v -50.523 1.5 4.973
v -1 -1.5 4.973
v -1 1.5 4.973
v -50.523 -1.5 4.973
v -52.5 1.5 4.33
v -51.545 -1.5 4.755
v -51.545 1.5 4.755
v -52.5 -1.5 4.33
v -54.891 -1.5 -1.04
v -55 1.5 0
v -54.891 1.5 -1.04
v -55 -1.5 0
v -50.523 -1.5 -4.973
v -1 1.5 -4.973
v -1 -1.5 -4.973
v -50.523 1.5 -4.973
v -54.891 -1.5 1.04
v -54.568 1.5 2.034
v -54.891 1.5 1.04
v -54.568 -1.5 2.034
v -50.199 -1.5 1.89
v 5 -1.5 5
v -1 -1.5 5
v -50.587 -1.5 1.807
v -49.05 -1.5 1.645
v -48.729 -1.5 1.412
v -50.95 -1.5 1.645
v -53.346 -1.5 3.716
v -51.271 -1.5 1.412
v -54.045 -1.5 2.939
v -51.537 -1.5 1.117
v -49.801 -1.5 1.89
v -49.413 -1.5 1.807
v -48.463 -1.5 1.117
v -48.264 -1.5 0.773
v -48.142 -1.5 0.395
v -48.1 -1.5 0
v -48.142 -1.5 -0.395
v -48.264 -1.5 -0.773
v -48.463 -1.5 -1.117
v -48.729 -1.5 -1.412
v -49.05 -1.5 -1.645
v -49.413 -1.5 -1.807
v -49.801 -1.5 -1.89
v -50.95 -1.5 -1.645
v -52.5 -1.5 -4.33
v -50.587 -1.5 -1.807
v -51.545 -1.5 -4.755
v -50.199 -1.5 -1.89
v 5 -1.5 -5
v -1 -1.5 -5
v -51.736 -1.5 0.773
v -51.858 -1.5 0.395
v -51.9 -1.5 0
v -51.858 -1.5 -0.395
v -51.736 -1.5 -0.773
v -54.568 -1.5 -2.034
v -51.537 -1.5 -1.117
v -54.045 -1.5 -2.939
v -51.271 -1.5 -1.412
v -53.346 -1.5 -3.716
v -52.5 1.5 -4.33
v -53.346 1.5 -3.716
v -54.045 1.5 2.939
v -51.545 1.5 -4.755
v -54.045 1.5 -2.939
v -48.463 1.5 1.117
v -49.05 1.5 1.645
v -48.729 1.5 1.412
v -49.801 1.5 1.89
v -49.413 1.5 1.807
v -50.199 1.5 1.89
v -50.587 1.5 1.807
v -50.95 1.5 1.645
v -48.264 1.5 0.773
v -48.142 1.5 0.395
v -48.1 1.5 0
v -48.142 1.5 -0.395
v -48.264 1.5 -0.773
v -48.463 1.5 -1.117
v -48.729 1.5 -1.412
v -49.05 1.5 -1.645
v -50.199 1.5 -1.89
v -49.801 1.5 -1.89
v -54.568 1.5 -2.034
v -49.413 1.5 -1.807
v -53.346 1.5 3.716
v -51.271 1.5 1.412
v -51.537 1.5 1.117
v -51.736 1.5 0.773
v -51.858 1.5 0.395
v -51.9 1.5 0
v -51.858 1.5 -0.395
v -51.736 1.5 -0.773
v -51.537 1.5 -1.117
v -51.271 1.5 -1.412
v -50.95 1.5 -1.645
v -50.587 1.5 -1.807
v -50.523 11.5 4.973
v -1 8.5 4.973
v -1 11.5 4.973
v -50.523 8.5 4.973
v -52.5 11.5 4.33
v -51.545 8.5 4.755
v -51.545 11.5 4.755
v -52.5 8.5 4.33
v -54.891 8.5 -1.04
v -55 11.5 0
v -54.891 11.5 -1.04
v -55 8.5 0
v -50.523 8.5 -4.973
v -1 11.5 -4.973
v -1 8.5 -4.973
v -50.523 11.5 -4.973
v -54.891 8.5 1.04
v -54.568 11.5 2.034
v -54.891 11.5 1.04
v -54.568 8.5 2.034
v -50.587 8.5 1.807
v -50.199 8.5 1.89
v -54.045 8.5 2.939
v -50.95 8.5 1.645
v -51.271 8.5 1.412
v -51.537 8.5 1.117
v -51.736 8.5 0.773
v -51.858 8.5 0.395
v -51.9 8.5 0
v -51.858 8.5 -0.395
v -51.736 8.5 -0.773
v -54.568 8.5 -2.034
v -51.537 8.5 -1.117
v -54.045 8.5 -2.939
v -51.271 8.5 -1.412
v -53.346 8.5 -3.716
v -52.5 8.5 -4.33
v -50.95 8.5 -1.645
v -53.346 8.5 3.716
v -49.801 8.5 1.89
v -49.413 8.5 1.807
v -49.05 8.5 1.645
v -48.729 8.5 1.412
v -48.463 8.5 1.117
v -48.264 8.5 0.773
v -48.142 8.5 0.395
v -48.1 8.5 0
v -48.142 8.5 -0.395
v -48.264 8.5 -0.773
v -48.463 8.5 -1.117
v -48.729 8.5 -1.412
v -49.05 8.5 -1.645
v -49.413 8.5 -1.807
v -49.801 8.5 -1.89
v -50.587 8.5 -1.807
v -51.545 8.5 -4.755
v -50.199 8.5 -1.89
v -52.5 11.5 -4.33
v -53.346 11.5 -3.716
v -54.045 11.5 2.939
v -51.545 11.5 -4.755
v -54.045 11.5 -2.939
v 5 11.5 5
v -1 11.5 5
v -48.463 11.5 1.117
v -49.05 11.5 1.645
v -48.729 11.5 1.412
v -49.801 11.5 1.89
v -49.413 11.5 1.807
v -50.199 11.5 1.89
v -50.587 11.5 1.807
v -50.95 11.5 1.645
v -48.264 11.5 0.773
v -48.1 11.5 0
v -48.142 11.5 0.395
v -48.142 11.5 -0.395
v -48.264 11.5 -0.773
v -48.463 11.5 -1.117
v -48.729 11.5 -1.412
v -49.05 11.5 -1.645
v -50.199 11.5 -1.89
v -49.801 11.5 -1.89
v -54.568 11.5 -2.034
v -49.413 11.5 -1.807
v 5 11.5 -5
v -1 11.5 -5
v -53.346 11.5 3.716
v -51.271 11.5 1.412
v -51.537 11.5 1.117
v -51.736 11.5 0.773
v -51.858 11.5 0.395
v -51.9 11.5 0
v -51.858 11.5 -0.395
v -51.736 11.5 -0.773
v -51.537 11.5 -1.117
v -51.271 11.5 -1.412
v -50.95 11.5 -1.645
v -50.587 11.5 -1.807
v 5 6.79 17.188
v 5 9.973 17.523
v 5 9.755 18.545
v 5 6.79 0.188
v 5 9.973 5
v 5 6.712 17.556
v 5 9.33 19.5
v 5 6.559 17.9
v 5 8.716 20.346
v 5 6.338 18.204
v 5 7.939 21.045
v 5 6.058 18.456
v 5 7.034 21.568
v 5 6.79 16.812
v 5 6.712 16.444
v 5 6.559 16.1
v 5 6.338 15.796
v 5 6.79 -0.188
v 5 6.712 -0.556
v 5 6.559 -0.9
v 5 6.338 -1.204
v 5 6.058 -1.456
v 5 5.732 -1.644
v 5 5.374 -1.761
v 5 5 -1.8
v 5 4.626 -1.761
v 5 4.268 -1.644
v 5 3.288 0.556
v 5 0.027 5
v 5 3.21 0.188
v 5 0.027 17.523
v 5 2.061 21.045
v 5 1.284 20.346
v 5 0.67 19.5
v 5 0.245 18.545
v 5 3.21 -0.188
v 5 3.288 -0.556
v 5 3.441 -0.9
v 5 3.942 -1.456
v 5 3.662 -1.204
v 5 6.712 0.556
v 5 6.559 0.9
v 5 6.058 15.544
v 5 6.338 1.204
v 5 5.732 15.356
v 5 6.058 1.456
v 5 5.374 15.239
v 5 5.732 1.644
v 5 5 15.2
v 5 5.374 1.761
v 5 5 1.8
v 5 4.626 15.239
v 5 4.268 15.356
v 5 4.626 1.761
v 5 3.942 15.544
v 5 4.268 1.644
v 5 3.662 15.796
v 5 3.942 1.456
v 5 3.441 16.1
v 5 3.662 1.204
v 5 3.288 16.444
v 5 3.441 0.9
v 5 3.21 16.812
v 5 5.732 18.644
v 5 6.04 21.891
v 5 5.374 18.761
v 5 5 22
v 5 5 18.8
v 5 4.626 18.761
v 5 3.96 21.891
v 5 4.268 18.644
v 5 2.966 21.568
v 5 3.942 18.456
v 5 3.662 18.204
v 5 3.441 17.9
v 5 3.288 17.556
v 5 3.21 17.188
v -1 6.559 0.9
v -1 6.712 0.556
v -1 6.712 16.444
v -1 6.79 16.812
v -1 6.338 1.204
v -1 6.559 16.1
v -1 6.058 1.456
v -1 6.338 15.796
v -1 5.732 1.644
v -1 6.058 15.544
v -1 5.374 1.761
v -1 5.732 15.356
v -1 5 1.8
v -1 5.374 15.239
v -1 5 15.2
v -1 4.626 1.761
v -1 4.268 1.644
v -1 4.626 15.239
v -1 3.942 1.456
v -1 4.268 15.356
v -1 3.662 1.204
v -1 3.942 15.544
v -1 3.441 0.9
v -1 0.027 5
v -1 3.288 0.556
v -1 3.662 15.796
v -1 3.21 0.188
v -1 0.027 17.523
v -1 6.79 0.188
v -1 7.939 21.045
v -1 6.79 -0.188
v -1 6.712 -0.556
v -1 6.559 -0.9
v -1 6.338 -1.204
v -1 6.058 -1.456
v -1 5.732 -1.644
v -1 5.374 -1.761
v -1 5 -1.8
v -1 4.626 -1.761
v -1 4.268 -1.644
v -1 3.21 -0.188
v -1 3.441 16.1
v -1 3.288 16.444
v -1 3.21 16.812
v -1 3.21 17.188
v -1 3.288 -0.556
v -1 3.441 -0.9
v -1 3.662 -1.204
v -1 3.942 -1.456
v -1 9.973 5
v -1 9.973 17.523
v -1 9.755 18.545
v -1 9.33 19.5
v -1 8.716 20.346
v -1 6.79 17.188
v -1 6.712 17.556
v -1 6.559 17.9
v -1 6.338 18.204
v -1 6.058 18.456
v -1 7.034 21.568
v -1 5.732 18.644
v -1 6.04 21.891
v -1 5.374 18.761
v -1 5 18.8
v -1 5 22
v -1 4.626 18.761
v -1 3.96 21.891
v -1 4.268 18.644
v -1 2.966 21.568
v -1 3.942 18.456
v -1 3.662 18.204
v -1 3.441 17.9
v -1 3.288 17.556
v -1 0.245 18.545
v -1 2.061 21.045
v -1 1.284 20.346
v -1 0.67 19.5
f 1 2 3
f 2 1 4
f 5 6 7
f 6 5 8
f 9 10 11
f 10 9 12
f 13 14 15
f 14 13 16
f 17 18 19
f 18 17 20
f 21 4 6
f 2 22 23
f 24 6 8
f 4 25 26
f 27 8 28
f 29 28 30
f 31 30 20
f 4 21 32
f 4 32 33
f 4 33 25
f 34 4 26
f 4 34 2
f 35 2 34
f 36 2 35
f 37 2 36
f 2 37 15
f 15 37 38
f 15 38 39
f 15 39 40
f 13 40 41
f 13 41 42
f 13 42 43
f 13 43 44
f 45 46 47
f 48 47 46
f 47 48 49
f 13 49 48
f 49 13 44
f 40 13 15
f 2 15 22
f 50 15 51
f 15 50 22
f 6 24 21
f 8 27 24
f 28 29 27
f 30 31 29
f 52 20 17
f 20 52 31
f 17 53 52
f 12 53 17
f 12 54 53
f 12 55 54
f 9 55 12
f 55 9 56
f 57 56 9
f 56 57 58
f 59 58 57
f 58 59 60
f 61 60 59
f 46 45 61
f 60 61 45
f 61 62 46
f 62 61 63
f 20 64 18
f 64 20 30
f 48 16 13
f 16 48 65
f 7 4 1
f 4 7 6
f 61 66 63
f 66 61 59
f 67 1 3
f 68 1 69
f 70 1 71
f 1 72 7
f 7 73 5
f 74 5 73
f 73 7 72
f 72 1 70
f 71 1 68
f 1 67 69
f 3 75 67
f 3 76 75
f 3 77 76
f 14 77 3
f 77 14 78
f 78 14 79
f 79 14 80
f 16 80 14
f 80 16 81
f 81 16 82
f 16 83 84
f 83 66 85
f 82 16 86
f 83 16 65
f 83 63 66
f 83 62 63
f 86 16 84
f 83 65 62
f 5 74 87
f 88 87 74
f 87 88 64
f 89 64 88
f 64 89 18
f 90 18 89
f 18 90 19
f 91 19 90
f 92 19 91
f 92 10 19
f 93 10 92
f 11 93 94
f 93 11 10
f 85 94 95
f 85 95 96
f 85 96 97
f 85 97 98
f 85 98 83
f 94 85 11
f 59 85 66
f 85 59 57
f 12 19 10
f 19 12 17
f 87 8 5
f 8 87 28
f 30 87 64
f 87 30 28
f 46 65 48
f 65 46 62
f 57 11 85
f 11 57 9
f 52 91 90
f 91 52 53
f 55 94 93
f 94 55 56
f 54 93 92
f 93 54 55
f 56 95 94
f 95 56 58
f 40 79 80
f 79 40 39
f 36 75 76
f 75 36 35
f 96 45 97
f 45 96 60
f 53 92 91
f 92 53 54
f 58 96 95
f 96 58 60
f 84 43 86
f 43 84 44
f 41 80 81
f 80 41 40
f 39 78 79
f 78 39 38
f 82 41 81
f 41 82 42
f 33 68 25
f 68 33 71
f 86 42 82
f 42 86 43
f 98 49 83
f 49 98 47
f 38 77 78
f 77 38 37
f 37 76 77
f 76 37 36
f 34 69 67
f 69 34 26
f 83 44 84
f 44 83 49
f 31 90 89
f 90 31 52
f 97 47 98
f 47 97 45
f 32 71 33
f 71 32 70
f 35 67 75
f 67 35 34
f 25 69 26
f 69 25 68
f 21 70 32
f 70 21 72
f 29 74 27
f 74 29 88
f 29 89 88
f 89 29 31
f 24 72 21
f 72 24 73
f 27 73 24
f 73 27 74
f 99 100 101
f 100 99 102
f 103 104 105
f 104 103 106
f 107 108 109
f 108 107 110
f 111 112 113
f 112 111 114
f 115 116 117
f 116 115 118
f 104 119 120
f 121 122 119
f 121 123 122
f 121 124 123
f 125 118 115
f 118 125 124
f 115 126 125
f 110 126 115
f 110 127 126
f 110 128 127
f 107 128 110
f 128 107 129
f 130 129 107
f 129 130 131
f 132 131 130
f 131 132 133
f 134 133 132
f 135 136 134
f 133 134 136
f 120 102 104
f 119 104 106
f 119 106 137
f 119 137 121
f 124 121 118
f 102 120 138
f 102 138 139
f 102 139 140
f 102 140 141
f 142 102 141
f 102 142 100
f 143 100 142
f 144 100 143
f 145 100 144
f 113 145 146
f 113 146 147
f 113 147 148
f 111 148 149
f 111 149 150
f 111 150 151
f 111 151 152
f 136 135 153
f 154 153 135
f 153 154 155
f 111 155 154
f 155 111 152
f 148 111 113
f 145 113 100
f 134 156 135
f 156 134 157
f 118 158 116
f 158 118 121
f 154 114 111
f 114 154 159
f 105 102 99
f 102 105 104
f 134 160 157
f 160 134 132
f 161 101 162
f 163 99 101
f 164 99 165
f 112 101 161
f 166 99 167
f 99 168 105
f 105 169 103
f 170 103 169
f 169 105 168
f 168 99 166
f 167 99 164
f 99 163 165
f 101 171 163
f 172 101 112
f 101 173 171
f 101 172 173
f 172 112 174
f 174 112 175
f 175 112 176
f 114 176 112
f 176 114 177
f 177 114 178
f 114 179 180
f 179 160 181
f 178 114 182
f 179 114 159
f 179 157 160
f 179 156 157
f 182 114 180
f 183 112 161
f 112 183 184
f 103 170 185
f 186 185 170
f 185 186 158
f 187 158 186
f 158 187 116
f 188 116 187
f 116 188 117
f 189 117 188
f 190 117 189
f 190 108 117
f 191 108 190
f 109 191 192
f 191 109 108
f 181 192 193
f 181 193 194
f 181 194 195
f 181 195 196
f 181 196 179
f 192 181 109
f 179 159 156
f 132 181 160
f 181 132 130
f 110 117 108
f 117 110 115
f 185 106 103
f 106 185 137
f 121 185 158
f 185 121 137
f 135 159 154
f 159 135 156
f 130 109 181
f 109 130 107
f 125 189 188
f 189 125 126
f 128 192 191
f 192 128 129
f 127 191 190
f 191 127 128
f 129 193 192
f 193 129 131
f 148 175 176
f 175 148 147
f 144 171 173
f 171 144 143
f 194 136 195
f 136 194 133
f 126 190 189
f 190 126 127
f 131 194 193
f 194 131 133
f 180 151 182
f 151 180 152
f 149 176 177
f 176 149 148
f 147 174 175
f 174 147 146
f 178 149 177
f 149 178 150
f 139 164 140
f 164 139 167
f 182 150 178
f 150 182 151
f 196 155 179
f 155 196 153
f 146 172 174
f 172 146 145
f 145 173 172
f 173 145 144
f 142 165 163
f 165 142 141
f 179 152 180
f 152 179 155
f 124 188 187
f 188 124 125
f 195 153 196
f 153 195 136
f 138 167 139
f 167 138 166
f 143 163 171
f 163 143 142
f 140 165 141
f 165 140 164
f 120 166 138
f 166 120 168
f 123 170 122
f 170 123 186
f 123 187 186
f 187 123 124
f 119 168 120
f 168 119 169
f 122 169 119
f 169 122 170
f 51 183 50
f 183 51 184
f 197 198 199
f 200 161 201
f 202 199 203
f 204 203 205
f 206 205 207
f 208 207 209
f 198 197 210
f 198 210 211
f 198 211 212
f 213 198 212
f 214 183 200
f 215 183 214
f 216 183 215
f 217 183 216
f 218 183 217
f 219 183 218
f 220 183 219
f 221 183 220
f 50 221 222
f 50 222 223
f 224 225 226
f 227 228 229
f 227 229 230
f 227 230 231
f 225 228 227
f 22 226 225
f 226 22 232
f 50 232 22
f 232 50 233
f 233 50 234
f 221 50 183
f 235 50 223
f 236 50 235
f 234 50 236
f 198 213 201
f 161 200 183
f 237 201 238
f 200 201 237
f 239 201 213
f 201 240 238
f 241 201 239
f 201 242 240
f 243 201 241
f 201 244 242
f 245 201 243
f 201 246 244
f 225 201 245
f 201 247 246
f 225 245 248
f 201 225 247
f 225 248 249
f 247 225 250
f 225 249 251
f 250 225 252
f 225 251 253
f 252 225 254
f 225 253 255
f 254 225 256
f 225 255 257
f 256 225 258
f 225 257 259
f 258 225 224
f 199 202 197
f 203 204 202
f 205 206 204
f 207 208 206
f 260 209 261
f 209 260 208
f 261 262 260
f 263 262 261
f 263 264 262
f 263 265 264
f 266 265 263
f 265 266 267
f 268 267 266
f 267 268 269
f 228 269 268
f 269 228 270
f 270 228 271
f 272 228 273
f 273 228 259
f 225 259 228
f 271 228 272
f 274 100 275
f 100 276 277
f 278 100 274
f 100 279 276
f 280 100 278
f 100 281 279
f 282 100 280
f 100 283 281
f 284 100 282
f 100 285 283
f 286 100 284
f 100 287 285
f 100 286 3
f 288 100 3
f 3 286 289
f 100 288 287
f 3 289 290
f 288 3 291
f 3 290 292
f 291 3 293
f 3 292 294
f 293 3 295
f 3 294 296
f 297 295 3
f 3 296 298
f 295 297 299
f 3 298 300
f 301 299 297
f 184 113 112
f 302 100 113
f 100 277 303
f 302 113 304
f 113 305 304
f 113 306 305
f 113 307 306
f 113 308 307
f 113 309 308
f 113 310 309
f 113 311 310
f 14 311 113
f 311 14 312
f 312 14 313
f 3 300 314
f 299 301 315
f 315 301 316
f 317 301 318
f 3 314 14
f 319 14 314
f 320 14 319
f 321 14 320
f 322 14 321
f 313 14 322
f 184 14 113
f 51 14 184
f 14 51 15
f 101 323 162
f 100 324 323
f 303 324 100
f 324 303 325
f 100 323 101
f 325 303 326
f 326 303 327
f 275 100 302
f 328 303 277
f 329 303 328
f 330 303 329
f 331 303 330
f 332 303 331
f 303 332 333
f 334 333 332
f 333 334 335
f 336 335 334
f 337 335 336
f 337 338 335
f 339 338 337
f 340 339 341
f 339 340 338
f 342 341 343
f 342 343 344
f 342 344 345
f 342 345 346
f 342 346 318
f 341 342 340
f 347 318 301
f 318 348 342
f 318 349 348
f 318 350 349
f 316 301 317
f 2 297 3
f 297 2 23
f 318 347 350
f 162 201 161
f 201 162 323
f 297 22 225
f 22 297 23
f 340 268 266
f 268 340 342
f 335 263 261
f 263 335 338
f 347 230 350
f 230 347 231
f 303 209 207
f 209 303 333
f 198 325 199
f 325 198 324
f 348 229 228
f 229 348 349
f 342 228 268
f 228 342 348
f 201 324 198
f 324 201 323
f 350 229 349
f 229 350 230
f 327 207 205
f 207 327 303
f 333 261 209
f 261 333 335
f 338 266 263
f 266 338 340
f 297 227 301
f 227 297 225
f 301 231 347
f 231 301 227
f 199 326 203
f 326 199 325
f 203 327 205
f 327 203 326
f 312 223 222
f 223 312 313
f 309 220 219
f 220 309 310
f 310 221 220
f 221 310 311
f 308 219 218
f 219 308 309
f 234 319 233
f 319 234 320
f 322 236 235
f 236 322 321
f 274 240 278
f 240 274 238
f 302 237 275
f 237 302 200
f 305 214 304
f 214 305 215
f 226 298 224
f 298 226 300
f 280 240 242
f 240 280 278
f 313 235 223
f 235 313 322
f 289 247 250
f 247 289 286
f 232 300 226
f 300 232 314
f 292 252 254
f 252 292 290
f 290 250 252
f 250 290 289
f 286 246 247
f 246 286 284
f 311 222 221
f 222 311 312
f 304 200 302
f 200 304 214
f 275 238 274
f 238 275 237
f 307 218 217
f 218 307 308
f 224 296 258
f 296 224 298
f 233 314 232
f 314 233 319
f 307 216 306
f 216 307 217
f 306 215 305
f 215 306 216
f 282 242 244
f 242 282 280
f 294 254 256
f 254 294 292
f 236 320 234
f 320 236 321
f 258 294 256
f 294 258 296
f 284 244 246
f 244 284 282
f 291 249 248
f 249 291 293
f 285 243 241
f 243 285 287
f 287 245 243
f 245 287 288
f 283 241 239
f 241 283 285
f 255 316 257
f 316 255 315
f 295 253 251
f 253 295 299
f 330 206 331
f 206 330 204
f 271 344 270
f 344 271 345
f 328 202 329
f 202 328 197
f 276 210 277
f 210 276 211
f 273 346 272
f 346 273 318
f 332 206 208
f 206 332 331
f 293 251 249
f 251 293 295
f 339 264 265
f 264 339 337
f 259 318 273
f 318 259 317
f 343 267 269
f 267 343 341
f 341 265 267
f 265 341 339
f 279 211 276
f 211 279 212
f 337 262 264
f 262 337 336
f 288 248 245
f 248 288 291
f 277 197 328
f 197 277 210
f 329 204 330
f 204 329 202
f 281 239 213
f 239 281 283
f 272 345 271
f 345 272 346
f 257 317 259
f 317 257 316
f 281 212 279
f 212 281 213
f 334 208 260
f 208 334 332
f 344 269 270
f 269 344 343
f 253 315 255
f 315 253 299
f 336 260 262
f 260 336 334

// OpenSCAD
////    c1=costat llarg   c2=costat curt  h=alçada    g=gordura parets  d=distancia legs    w=distancia roda    ////

c1=65;
c2=28;
h=35;
g=3;
d=50;
w=10;

module s()
        cylinder(h=6.5,r=1.8,center=true,$fn=30);
    
module leg(){
    difference(){
        hull(){
            cylinder(h=g,r=5,center=true,$fn=30);
            translate([d,0,0])
                cylinder(h=g,r=5,center=true,$fn=30);
        }
        translate([d,0,0])
            cylinder(h=6.5,r=1.9,center=true,$fn=30);
    }
}
module sup(){
    rotate([0,90,0])
    rotate([90,0,0])
        leg();
    rotate([0,90,0])
    translate([0,w,0])
        rotate([90,0,0])
            leg();    
    translate([-5,-g/2,-1])
        cube([10,w+g,6]);
    translate([-17,w/2,g-1])
        hull(){
            cylinder(h=2*g,r=5,center=true,$fn=30);
            translate([17,0,0])
                cylinder(h=2*g,r=5,center=true,$fn=30);  
        }
    //translate([4,-0.5,-5])
        //cube([5,17,10]);
}

module wheel(){
    rotate([0,90,0])
        difference(){
            sup();
            translate([0,w/2,g-1])
                s();
            translate([-17,w/2,g-1])
                s();
            //translate([-5,g/2,0])
                //cube([13,w-g,2]);
        }
}

wheel();
